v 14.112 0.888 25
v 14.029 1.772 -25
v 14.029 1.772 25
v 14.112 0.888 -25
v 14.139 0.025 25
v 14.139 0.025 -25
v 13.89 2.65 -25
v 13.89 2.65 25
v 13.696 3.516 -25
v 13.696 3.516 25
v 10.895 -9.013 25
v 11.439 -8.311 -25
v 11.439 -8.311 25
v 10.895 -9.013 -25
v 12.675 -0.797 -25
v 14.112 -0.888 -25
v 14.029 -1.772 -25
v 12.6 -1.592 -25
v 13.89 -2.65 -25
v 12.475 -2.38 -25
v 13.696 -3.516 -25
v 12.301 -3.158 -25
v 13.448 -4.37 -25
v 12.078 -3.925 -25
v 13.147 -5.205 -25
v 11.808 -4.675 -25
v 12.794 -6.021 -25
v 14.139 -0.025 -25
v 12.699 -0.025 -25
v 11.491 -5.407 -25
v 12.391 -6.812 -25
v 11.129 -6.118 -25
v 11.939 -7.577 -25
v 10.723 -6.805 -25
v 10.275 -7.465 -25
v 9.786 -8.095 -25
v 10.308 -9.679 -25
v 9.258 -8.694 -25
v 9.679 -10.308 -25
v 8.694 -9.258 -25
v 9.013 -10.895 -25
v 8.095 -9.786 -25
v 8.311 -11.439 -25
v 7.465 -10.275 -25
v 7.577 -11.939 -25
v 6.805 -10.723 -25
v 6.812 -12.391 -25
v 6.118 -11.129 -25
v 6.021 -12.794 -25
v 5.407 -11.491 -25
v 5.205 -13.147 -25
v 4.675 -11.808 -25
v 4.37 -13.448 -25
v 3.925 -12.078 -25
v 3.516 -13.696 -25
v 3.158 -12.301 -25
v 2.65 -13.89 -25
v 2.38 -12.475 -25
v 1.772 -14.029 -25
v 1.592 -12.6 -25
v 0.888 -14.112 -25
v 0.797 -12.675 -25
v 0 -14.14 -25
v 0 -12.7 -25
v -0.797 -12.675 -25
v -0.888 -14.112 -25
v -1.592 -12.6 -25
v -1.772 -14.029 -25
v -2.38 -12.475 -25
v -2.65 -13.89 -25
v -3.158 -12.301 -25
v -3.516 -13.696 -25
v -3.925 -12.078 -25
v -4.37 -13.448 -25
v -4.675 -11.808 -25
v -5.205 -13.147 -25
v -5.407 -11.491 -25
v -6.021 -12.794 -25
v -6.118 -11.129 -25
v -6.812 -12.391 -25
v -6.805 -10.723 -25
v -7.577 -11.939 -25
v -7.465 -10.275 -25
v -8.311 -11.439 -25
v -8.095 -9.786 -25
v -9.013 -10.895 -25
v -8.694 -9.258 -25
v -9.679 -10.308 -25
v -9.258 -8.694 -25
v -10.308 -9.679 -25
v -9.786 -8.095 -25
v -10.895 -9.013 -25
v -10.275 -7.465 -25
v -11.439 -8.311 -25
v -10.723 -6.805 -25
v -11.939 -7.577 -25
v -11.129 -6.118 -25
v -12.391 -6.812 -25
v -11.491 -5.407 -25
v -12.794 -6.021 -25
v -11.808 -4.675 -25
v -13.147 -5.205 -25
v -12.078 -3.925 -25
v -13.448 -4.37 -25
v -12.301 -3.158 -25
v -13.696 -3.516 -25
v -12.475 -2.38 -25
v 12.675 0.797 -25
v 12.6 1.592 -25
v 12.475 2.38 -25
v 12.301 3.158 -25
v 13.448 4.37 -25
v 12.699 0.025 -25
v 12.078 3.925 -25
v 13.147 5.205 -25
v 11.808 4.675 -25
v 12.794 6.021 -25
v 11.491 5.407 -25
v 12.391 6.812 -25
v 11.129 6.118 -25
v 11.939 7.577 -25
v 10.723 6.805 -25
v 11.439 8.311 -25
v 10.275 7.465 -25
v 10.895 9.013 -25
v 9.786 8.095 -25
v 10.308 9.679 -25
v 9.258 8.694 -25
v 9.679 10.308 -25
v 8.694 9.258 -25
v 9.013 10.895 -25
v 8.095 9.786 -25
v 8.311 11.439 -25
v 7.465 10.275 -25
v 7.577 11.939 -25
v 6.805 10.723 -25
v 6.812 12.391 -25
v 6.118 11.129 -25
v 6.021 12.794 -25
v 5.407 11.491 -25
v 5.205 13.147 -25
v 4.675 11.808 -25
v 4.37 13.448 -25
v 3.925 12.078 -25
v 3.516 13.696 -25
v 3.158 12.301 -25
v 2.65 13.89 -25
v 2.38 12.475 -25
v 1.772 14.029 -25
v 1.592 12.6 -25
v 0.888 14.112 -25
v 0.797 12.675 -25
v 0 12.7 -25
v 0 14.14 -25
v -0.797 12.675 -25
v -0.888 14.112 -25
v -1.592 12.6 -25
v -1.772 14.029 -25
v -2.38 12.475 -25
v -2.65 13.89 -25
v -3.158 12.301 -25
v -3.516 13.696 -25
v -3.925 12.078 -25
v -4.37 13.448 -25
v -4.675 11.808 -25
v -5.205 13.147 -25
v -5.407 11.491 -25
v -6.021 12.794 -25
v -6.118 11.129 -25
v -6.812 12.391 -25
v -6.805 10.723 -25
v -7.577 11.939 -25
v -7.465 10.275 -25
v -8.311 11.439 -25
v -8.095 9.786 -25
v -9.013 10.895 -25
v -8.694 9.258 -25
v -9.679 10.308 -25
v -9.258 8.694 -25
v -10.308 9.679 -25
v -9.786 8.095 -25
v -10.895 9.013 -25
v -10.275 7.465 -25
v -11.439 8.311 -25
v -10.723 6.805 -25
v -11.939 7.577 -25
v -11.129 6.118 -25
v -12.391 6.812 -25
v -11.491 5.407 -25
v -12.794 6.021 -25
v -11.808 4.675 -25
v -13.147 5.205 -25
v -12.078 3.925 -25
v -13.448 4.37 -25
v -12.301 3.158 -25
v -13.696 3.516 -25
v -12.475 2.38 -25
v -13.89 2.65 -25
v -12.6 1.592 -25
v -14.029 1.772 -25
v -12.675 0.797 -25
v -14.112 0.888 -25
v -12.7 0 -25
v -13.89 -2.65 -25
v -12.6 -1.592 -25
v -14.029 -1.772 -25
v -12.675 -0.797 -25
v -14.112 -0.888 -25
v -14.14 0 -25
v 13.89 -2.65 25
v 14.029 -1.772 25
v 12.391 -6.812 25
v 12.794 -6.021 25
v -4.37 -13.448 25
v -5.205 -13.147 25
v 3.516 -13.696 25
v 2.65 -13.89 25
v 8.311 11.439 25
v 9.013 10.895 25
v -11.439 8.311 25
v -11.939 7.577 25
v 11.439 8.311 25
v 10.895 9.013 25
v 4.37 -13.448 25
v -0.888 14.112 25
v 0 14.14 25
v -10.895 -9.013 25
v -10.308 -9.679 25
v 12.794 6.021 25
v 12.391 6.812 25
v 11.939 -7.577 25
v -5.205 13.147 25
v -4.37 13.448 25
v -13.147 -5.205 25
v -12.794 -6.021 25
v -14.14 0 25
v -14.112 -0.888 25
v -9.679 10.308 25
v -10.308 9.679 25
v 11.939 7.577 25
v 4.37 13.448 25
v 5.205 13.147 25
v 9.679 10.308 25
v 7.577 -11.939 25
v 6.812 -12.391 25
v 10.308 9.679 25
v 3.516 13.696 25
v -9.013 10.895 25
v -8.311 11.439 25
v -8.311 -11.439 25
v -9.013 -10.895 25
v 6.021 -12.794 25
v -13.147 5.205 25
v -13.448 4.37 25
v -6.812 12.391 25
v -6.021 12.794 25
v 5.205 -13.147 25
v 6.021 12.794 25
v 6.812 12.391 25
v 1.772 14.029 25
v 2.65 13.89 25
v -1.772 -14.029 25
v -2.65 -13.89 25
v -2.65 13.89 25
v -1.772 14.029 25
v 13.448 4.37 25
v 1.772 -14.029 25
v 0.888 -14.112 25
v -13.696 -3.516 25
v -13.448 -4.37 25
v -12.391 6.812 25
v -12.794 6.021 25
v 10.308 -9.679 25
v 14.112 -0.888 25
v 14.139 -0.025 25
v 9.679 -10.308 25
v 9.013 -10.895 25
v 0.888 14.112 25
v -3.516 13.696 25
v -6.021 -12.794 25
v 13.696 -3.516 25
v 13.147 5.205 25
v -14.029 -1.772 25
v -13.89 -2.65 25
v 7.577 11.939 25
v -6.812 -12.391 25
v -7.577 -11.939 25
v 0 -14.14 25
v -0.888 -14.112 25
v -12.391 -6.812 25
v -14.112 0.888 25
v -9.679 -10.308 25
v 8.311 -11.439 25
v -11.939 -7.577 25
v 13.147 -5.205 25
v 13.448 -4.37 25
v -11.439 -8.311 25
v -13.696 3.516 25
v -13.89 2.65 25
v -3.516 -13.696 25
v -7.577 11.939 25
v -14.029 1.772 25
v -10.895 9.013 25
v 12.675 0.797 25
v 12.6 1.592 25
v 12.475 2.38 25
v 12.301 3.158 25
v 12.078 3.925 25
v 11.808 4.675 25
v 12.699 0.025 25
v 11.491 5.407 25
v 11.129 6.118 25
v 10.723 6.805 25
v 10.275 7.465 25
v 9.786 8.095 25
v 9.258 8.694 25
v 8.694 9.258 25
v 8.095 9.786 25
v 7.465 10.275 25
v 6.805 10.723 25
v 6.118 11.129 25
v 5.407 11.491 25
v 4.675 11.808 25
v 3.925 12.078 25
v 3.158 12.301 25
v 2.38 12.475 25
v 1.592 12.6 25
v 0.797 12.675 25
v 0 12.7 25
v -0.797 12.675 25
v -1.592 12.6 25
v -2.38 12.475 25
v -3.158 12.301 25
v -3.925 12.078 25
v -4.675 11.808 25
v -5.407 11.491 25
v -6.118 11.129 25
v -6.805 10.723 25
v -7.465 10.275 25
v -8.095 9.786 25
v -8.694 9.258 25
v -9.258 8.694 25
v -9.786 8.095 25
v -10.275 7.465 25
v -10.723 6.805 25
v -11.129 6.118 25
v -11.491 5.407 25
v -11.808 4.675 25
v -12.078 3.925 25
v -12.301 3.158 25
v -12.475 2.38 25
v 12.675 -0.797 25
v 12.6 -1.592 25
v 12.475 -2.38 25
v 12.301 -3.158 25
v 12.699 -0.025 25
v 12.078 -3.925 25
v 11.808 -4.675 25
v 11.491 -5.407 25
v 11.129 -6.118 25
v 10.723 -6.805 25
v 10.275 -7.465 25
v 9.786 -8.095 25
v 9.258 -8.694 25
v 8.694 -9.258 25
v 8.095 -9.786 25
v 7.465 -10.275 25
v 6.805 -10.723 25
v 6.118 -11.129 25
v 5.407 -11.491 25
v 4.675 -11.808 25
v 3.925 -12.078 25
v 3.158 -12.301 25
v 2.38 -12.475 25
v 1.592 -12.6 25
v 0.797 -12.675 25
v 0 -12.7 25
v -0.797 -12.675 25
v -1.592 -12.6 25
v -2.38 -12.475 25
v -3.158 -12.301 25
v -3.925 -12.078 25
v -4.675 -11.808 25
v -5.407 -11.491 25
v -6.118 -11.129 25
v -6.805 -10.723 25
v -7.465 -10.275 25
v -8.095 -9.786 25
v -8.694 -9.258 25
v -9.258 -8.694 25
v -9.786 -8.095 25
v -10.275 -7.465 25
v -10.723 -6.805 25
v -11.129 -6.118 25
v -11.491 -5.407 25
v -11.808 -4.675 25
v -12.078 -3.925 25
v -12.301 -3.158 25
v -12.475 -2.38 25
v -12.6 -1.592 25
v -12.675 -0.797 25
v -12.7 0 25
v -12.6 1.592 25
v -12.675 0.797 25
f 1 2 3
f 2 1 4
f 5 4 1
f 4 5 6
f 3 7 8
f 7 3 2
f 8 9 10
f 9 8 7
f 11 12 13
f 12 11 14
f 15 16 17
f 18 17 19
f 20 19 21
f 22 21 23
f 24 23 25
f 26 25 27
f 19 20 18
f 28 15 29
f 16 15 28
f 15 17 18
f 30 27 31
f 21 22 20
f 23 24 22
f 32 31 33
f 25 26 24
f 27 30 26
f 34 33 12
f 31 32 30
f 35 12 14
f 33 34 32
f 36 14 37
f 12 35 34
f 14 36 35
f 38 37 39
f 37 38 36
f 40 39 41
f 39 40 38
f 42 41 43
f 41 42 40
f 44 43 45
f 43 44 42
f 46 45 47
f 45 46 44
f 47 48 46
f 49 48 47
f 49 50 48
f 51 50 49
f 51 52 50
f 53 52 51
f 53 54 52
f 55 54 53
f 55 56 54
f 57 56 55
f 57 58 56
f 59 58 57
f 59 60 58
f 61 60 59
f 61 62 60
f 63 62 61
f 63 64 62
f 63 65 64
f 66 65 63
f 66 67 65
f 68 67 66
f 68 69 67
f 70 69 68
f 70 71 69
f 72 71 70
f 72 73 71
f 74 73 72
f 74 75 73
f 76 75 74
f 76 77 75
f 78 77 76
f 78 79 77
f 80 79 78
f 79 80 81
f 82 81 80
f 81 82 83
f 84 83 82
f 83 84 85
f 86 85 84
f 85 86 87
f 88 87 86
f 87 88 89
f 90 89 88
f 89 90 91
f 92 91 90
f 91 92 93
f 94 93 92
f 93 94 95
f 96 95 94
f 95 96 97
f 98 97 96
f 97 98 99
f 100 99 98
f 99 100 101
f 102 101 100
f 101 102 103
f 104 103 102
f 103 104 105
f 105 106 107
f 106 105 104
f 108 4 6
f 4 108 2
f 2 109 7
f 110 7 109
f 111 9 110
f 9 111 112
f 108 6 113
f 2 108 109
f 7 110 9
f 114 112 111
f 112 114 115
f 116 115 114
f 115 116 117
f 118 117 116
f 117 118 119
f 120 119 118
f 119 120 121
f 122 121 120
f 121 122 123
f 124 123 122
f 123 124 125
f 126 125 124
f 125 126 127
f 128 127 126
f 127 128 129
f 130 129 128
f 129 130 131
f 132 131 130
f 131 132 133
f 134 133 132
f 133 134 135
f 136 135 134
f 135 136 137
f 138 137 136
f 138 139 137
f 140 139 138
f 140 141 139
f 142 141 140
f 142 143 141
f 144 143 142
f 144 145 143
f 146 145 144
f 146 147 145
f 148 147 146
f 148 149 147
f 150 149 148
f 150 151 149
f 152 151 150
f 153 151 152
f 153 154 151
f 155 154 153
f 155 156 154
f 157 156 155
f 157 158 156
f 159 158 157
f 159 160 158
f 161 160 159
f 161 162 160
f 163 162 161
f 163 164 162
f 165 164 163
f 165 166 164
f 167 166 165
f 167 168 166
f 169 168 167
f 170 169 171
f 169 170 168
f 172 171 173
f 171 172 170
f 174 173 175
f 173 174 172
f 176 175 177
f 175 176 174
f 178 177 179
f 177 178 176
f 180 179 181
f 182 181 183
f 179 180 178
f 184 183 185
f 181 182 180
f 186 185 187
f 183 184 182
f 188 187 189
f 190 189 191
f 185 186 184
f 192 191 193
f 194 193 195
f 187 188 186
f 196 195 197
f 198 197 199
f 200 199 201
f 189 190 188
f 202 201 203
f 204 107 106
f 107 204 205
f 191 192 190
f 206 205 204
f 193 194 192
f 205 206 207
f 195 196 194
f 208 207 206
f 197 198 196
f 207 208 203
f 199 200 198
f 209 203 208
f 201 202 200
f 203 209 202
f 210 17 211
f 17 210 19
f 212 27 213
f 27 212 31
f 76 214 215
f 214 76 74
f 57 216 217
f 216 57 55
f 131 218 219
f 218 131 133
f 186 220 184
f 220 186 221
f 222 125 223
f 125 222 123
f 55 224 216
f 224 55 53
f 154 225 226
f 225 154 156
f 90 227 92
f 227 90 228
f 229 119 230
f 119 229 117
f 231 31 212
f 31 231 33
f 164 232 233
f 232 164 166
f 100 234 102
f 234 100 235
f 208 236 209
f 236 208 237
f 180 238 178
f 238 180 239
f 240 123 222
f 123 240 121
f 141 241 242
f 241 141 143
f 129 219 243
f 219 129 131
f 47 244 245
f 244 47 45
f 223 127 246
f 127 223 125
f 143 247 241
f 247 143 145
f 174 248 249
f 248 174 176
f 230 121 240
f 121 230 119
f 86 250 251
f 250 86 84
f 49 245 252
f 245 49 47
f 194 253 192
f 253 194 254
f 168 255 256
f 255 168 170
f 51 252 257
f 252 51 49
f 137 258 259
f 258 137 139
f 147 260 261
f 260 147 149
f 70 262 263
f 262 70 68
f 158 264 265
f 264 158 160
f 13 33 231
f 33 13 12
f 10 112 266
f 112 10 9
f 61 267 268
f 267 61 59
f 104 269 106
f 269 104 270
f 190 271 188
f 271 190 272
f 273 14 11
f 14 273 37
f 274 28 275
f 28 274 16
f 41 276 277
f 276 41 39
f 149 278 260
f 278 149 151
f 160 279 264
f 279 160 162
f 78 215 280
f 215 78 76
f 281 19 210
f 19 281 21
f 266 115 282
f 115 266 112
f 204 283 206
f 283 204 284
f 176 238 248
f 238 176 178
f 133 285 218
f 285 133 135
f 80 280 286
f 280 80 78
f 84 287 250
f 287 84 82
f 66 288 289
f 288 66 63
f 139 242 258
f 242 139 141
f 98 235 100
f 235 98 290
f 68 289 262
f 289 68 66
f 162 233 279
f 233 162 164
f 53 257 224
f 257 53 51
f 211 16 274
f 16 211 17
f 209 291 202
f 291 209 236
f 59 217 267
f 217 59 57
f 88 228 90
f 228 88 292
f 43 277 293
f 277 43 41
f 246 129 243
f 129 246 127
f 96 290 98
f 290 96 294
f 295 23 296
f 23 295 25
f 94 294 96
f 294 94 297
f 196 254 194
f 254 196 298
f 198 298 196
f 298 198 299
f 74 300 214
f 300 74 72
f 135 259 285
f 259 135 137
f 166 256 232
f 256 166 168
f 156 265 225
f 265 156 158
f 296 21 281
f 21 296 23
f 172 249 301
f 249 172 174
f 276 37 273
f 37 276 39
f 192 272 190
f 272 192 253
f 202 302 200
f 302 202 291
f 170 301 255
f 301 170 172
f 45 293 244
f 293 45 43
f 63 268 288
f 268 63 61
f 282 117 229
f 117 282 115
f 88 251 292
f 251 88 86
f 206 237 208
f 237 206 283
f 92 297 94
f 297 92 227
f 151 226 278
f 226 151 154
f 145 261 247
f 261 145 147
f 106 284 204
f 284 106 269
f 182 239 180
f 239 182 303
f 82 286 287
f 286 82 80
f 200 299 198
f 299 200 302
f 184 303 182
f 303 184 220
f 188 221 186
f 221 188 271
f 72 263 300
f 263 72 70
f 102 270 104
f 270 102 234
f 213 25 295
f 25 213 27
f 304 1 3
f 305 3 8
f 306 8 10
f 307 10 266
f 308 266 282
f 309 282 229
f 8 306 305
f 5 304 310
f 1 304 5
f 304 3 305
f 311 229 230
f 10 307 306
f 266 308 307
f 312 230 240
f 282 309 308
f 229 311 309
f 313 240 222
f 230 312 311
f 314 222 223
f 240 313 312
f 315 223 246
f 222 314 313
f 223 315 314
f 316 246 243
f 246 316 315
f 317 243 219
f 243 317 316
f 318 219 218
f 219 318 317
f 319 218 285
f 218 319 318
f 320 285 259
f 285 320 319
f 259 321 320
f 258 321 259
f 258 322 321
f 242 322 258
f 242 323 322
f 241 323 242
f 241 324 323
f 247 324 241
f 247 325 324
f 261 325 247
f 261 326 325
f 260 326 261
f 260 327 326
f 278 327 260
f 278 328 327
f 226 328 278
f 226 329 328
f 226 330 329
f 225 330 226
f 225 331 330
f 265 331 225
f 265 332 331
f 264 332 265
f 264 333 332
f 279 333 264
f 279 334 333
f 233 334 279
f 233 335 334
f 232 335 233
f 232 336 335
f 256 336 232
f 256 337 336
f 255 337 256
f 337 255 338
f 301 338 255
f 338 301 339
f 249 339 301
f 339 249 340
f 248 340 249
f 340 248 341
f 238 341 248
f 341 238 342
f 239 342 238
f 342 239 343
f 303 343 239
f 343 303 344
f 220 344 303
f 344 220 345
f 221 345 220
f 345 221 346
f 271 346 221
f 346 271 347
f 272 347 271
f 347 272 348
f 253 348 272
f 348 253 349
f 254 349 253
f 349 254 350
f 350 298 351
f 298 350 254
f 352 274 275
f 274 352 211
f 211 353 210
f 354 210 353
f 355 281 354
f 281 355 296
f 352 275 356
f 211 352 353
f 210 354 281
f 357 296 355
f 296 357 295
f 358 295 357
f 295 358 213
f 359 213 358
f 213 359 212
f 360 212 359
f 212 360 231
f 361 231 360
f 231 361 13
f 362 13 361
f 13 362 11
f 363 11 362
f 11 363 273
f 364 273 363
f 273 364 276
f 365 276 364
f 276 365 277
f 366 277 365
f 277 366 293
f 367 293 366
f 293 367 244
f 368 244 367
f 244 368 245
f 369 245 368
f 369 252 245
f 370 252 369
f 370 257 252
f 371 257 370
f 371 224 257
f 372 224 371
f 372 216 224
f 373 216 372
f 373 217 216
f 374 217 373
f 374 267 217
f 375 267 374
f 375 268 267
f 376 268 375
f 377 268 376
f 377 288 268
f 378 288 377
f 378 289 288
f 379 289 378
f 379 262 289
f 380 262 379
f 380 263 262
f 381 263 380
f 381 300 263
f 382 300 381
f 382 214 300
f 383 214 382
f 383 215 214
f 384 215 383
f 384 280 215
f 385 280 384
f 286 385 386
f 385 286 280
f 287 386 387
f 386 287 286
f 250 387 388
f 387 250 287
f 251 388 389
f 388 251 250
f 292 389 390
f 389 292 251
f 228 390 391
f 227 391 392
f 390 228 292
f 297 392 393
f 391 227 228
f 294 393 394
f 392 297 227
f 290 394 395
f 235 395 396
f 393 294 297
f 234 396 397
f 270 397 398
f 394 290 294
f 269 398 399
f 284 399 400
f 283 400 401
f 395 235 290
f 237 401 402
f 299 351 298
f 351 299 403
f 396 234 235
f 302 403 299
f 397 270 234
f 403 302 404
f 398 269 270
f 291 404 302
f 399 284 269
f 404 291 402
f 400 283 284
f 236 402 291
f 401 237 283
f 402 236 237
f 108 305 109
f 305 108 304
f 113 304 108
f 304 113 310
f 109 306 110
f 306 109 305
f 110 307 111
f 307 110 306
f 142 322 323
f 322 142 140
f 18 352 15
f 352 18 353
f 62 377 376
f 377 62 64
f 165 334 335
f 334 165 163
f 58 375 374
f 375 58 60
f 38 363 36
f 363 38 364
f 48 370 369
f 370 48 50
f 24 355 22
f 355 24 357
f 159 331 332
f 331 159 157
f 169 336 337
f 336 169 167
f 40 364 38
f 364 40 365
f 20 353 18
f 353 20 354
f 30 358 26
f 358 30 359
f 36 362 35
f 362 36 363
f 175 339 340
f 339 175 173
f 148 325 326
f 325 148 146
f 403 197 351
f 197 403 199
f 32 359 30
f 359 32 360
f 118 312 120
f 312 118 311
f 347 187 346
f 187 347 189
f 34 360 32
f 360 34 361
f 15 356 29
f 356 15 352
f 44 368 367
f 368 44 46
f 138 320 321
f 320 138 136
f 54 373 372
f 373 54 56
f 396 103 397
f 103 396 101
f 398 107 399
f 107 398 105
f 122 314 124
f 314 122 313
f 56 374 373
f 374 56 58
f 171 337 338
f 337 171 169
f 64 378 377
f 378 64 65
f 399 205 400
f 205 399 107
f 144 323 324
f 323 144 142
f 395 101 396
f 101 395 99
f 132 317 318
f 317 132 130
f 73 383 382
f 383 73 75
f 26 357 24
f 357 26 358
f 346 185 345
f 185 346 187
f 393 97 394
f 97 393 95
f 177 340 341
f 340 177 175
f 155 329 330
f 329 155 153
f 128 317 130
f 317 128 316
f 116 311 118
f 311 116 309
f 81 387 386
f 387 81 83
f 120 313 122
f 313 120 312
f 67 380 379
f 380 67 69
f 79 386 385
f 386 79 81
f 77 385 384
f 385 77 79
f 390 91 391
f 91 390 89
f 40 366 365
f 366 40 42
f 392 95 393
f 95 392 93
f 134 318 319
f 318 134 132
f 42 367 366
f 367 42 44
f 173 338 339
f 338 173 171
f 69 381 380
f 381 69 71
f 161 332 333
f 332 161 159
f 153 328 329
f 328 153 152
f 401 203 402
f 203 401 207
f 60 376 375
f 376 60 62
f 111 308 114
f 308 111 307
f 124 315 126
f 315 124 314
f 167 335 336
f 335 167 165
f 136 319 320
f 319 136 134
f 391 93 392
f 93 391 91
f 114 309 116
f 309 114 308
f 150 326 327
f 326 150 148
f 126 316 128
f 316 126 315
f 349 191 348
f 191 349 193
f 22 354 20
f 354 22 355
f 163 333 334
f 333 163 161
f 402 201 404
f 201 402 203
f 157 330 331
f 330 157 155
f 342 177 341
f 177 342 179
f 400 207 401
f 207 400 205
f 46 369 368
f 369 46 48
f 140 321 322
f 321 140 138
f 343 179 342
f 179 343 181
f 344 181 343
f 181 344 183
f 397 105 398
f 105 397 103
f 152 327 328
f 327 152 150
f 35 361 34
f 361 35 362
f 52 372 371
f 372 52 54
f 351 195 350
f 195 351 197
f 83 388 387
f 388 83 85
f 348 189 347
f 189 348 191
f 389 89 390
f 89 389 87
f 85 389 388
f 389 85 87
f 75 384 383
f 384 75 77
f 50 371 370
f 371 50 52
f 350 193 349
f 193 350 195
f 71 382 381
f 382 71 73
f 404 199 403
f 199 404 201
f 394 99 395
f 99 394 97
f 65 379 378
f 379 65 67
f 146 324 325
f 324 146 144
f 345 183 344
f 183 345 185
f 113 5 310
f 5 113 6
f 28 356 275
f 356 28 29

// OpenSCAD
// Light path tube. DoMB SPIM
// Borys Olifirov 2025

tube_h = 50;
tube_id = 25.4;  //1.35

wall_w = 1.5;
wall_tol = 0.06;
slit_gap = 0.05;
$fn = 100;

module TubeEnclosure() {
    difference() {
        cylinder(d = tube_id+(wall_w-wall_tol)*2, h = tube_h, center = true);
        cylinder(d = tube_id, h = tube_h+2, center = true);
        translate([10,0,0])
            cube([tube_id, slit_gap, tube_h+4], center = true);
        
    }
}

TubeEnclosure();
